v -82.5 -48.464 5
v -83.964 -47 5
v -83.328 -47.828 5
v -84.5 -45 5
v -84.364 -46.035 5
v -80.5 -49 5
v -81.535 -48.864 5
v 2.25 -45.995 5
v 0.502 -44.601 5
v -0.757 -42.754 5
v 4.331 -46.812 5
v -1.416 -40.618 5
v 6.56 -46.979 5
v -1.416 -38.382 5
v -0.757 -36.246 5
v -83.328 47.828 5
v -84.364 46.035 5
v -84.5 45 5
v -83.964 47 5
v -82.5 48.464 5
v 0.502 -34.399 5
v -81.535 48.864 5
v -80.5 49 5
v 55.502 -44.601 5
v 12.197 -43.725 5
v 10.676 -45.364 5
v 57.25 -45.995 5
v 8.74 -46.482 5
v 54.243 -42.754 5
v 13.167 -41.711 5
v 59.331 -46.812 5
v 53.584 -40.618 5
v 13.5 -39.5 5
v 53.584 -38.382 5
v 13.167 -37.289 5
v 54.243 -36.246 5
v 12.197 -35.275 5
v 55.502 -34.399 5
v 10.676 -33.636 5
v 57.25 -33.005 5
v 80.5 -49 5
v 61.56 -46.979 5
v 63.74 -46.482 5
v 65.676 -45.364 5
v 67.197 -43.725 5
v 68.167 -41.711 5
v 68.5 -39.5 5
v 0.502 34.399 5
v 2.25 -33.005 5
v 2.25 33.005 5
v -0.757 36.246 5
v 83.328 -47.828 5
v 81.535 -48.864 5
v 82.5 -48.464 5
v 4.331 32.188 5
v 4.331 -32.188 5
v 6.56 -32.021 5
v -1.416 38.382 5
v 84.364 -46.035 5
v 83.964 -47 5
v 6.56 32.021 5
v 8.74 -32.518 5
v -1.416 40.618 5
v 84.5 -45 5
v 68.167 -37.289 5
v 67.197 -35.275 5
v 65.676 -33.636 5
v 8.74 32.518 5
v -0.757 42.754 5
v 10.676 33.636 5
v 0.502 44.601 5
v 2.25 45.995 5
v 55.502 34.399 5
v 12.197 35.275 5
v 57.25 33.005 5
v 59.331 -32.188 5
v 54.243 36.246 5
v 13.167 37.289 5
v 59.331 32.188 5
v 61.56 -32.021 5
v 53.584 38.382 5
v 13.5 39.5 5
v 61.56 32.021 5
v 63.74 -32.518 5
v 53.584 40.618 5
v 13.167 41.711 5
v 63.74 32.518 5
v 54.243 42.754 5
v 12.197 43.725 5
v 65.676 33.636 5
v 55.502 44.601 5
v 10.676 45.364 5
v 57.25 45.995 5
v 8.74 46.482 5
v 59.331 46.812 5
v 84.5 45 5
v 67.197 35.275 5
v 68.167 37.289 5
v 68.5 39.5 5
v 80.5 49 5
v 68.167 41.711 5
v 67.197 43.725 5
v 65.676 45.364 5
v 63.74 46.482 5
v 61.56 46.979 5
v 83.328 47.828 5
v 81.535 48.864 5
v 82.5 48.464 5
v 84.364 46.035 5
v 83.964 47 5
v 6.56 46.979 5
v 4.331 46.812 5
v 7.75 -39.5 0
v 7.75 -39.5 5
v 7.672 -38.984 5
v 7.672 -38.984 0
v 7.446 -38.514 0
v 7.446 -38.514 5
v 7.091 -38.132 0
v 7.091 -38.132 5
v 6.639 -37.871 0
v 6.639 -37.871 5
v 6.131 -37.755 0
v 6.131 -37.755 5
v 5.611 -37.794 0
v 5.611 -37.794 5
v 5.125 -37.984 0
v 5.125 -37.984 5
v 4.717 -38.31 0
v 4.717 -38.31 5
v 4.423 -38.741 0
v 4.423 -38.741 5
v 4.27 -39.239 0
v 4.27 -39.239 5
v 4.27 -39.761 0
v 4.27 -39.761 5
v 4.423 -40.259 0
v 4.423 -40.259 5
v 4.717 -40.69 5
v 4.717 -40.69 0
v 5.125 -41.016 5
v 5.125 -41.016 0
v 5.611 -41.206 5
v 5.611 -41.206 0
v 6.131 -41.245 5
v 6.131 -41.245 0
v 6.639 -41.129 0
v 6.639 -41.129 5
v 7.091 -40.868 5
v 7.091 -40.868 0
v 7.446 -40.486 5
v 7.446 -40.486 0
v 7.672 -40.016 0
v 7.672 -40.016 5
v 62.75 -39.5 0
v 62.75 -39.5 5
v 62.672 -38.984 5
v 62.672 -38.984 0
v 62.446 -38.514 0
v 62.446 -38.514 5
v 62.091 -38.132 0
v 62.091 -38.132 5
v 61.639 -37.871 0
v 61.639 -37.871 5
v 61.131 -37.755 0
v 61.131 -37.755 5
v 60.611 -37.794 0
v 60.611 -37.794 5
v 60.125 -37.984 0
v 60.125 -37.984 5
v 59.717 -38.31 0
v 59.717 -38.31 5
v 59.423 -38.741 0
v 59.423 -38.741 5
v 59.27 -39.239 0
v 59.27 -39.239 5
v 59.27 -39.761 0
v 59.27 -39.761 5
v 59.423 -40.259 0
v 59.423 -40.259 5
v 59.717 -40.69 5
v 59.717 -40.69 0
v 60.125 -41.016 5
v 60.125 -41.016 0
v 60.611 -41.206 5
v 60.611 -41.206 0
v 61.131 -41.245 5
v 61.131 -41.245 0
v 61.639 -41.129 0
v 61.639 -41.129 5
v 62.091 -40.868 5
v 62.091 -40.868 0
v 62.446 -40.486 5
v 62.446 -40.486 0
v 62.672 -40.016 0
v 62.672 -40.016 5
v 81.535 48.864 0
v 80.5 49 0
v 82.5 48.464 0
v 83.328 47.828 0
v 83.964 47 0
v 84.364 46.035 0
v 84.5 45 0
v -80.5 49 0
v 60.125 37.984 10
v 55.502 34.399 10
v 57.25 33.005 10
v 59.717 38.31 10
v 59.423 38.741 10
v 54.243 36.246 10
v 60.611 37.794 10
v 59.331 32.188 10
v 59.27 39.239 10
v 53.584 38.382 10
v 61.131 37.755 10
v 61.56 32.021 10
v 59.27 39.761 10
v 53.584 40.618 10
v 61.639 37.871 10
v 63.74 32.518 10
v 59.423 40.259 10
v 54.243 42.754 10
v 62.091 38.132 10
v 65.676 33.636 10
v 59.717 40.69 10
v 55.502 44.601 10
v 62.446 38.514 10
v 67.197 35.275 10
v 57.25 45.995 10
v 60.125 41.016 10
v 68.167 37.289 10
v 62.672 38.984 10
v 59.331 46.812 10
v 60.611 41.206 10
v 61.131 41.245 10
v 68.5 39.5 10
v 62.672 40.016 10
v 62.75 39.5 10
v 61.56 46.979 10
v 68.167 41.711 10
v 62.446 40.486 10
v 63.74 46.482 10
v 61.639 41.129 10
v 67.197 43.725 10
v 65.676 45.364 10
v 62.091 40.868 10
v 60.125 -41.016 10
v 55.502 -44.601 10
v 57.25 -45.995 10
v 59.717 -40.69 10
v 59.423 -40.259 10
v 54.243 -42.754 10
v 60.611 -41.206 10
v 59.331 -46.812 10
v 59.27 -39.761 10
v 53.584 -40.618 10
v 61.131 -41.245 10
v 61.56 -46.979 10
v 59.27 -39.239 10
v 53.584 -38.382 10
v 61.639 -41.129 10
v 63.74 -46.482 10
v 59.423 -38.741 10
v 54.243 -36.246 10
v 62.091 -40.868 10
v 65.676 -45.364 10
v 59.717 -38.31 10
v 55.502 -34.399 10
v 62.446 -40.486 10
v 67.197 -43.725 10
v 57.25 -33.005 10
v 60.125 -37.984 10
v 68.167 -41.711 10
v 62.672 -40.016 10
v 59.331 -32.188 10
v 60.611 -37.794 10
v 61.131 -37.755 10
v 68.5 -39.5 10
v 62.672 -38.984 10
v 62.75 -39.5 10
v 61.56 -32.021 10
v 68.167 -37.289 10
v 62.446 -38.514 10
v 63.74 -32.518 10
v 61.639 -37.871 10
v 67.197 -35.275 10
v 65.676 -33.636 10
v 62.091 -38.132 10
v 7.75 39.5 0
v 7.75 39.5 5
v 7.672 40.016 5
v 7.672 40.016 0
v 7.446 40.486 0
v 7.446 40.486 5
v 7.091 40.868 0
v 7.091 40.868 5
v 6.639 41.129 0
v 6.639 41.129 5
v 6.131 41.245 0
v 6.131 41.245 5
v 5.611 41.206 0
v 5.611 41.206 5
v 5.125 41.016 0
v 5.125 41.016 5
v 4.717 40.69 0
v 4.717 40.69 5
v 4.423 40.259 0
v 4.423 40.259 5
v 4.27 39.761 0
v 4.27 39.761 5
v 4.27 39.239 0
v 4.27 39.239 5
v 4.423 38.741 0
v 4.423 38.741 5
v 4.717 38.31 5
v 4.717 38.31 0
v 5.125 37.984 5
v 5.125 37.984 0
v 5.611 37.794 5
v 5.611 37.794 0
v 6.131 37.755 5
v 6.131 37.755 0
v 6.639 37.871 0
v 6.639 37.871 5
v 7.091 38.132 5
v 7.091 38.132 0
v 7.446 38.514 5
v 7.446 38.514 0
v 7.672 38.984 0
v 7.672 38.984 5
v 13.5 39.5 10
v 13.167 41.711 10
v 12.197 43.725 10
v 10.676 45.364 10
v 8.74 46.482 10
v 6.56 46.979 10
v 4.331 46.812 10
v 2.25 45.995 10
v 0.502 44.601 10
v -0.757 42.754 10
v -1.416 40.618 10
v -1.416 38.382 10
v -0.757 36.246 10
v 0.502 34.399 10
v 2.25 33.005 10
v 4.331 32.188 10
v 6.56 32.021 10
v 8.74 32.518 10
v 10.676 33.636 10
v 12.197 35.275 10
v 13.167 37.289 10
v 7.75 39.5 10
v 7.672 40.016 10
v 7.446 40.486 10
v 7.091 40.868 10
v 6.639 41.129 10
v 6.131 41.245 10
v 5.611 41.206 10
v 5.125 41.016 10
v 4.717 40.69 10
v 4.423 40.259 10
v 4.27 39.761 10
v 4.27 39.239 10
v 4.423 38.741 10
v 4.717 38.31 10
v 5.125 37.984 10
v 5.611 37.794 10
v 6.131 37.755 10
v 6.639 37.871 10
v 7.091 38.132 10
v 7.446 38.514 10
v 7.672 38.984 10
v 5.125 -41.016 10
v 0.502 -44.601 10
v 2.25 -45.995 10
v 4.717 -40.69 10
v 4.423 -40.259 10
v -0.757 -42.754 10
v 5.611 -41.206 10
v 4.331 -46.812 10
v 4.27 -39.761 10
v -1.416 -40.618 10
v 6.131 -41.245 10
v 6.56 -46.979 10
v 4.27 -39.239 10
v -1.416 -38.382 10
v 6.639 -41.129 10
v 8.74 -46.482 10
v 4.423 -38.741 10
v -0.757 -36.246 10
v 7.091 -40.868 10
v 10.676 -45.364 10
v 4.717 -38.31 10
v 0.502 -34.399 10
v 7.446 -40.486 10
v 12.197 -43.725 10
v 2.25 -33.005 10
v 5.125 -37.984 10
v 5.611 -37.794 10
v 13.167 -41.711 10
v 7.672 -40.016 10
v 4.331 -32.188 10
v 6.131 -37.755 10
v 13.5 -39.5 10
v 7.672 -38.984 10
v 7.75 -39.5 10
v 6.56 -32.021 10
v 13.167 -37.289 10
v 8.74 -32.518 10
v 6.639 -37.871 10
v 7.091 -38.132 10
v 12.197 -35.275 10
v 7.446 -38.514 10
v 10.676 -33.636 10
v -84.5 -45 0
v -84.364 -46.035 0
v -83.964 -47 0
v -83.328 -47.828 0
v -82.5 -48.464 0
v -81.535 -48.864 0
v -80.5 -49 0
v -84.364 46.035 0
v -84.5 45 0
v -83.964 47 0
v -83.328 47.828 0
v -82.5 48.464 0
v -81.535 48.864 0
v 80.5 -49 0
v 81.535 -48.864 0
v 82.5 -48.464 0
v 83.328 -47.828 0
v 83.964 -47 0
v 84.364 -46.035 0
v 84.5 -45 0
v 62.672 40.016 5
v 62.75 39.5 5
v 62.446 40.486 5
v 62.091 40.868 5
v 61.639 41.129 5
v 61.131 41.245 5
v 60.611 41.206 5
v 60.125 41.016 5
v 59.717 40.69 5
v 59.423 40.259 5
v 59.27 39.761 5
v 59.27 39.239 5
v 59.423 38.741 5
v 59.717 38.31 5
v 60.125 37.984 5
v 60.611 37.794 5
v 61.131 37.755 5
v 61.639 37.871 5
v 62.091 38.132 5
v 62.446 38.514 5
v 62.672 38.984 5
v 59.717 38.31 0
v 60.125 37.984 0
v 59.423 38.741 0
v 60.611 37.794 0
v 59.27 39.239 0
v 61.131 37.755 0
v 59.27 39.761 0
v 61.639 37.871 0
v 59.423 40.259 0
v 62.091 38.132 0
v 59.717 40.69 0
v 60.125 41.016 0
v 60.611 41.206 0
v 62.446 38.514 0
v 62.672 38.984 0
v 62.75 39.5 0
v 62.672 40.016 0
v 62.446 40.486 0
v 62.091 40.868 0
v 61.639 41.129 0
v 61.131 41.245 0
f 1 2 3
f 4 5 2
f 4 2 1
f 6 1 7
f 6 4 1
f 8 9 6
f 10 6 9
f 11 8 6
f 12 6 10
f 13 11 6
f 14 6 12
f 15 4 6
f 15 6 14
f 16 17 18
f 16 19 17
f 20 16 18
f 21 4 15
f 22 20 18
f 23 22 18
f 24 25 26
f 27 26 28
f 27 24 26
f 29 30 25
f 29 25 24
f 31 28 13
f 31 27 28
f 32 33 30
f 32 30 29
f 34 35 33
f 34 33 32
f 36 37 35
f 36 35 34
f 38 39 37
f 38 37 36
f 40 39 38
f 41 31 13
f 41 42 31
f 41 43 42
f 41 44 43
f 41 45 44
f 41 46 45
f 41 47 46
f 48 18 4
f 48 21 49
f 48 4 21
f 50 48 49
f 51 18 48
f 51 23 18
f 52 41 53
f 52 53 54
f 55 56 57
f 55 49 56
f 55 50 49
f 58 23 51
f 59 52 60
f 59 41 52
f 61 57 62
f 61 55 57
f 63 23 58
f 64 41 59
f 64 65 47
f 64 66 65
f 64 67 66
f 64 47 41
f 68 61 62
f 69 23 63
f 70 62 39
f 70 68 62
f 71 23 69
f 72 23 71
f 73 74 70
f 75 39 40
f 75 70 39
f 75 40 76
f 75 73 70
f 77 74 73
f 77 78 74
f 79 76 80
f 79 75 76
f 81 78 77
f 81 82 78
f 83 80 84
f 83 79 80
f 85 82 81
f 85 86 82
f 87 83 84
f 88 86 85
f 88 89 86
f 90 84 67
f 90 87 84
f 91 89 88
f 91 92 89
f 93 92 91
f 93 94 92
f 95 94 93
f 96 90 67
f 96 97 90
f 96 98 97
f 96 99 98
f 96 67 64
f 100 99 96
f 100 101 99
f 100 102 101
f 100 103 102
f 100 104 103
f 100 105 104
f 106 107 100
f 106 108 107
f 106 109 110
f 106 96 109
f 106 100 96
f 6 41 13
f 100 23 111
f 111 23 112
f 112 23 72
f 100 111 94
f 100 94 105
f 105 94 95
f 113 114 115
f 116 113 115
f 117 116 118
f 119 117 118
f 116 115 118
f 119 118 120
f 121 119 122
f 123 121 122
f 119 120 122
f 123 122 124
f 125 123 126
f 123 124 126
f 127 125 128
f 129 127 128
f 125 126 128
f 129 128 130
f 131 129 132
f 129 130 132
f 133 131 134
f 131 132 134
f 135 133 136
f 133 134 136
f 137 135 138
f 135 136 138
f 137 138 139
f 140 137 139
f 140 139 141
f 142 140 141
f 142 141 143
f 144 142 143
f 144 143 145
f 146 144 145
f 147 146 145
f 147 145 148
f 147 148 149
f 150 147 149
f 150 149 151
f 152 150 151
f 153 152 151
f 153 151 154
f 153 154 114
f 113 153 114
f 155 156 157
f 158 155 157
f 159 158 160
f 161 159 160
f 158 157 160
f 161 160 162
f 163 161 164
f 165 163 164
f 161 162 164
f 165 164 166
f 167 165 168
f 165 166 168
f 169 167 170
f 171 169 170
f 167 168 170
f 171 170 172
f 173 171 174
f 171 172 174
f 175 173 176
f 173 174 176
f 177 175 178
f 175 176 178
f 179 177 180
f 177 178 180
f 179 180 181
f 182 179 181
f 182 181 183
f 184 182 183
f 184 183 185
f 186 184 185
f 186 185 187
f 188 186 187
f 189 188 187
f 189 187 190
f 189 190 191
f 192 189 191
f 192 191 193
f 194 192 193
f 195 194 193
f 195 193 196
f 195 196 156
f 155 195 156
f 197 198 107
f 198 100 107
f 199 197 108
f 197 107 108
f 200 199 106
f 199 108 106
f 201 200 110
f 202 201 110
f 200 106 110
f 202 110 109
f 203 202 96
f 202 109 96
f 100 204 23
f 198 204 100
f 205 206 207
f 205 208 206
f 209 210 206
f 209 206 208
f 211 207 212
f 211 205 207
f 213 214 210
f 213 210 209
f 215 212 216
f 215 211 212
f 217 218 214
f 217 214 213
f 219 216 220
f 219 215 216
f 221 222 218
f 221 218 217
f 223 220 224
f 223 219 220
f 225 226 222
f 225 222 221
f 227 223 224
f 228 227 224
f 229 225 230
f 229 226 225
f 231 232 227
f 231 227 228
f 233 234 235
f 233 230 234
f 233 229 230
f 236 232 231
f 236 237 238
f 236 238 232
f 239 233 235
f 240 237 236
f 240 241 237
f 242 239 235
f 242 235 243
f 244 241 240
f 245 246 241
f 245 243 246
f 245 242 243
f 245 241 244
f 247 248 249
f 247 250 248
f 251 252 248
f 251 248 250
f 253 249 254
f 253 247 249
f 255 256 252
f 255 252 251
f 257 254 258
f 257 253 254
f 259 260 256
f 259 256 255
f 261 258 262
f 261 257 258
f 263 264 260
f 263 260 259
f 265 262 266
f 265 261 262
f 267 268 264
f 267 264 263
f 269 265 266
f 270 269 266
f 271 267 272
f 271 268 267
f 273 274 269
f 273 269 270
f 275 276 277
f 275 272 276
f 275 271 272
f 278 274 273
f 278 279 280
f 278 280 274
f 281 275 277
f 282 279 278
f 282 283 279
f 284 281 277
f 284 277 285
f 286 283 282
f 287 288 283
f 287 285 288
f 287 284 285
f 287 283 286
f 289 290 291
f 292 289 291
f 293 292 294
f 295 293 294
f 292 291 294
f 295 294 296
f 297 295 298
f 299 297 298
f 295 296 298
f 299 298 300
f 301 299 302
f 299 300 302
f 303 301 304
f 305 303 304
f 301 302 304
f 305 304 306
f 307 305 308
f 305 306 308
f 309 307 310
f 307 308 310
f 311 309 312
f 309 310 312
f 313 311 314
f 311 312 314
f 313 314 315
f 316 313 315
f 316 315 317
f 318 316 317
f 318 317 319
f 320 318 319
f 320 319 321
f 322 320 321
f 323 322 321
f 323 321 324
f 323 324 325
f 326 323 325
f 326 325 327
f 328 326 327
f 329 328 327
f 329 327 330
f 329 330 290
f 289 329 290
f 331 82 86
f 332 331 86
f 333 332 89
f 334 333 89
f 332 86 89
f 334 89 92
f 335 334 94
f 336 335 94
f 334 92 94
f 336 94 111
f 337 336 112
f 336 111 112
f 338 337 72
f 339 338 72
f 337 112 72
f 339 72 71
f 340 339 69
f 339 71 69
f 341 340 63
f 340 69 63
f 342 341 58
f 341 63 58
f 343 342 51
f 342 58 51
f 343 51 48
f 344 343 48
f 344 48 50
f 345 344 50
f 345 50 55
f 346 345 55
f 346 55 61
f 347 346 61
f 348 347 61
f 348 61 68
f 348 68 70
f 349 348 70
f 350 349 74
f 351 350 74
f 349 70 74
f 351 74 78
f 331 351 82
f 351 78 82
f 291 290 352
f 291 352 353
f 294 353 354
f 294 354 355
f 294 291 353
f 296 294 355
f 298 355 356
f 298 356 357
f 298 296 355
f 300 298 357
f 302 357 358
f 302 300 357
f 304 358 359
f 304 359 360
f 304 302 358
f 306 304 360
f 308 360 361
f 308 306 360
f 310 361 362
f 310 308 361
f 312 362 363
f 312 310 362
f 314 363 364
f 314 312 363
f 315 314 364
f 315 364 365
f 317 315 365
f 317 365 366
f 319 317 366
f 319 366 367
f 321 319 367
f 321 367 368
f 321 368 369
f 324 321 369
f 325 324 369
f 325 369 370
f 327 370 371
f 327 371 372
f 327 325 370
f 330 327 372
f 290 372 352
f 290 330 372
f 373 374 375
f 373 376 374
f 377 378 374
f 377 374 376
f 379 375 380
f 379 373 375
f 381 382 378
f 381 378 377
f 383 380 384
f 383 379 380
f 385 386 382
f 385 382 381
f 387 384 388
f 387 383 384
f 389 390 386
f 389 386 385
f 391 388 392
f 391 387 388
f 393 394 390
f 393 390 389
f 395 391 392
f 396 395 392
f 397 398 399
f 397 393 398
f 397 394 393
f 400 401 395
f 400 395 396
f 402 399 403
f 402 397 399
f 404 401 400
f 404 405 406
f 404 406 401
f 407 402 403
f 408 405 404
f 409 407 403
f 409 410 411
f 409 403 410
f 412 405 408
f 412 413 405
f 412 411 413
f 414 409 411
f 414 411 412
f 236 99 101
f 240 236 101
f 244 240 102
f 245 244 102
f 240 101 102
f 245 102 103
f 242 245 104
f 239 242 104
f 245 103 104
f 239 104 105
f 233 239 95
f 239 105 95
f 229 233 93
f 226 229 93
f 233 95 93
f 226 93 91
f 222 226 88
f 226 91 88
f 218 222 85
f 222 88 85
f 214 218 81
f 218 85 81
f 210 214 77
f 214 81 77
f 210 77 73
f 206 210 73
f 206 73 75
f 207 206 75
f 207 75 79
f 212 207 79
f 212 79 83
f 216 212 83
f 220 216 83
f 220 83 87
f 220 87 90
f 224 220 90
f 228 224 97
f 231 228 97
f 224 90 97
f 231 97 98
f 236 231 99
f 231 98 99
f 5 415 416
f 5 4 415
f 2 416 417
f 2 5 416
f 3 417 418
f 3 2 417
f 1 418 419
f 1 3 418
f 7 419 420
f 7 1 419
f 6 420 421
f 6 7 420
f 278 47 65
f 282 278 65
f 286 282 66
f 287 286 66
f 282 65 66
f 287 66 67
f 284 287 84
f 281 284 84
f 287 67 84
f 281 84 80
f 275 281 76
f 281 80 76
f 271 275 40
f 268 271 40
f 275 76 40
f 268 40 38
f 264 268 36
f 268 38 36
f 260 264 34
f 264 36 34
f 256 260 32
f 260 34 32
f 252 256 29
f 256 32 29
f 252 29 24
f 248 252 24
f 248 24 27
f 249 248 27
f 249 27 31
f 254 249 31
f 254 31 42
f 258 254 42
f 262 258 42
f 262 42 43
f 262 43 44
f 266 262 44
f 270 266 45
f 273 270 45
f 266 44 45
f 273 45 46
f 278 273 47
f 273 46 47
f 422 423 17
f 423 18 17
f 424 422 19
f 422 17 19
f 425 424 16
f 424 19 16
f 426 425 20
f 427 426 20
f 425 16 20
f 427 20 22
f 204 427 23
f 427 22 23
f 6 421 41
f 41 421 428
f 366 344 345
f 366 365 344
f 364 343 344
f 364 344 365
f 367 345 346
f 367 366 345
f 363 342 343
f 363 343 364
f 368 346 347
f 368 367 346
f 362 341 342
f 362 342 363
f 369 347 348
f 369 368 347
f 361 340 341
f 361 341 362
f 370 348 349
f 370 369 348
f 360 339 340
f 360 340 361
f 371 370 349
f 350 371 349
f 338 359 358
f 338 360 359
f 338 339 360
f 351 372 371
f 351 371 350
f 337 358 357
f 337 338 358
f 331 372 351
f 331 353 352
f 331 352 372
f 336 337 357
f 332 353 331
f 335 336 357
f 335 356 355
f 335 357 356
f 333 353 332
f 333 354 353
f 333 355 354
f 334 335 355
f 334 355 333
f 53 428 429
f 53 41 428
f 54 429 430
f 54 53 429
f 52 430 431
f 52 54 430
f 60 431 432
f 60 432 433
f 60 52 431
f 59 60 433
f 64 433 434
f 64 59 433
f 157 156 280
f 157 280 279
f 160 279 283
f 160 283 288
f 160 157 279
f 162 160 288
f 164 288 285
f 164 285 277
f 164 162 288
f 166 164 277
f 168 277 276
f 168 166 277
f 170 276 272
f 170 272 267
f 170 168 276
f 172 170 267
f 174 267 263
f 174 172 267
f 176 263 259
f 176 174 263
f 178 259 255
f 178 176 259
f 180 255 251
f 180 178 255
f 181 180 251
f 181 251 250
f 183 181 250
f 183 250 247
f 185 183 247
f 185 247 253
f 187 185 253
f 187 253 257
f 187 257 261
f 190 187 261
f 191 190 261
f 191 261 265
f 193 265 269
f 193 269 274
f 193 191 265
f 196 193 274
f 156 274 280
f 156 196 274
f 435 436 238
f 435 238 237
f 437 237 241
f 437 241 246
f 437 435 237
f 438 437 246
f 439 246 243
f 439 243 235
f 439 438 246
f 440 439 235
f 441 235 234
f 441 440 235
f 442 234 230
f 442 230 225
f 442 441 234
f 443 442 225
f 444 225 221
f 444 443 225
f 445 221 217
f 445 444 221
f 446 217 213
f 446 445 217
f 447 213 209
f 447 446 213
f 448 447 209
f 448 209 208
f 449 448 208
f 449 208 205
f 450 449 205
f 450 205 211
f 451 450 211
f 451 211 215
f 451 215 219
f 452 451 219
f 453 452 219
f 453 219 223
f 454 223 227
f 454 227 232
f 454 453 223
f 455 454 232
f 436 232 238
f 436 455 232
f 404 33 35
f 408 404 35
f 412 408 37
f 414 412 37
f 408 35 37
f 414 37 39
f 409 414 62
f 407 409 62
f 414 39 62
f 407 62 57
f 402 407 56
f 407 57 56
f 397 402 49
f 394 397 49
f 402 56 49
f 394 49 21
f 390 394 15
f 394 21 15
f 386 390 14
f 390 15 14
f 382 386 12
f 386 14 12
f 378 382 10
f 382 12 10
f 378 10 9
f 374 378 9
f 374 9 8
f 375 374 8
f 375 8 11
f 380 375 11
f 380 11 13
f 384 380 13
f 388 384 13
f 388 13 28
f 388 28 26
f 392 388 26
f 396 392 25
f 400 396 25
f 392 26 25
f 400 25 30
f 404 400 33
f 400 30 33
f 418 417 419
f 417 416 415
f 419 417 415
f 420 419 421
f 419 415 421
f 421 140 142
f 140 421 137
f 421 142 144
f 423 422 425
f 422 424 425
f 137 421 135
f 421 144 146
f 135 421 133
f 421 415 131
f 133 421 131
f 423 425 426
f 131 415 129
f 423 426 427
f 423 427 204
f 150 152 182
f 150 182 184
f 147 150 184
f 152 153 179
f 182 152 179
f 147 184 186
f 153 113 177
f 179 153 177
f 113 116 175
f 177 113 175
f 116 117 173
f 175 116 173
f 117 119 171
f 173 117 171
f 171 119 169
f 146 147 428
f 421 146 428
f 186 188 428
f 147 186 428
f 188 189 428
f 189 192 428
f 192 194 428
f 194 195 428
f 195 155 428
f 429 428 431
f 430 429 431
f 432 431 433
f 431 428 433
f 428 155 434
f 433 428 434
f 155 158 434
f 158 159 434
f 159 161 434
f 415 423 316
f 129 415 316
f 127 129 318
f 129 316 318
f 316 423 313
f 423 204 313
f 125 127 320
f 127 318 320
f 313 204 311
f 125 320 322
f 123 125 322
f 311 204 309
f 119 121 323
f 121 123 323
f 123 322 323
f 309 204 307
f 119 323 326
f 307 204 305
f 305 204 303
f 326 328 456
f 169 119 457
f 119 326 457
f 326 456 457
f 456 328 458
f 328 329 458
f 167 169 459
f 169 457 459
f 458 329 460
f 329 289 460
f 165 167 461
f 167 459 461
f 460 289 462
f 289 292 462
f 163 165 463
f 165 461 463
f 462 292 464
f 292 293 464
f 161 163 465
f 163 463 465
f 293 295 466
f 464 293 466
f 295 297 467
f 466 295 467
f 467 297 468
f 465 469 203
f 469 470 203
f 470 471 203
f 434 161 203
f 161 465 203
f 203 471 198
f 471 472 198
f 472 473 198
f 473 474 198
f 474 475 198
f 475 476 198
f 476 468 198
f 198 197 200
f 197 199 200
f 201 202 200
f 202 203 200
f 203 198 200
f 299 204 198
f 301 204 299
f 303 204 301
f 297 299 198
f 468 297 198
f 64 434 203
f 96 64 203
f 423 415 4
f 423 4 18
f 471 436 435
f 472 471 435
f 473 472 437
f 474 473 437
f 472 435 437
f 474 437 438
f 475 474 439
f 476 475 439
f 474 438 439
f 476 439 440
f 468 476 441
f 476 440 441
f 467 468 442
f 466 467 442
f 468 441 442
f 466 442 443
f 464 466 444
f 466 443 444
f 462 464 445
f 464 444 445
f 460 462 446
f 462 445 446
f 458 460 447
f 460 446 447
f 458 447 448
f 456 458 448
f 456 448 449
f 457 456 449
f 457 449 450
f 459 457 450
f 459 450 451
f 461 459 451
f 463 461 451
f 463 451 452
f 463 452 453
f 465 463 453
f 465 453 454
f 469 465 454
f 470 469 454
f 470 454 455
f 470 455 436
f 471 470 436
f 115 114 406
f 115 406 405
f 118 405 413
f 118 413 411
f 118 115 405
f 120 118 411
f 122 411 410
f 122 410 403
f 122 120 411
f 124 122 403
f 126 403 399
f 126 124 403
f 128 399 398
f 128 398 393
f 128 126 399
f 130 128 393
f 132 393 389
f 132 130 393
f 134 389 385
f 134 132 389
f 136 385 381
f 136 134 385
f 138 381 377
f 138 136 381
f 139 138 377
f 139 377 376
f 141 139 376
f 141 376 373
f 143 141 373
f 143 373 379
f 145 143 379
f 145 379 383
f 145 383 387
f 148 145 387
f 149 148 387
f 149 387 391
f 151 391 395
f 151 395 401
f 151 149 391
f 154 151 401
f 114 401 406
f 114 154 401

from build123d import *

# Parameters (mm, degrees)
SKETCH_W      = 169
SKETCH_H      = 98
PAD_DEPTH     = 5
SKETCH001_R   = 1.75
POCKET_DEPTH  = 5.001
FILLET_R      = 4
SKETCH002_R   = 7.5
SKETCH002_R_2 = 1.75
PAD001_DEPTH  = 5


with BuildPart() as part:
    # Sketch → Pad (new body)
    with BuildSketch(Plane.XY):
        Rectangle(SKETCH_W, SKETCH_H)
    extrude(amount=PAD_DEPTH)

    # Sketch001 (on Face6 of Pad) → Pocket (cut, through all)
    with BuildSketch(Plane.XY.offset(5)):
        with Locations((6, 39.5)):
            Circle(SKETCH001_R)
        with Locations((61, 39.5)):
            Circle(SKETCH001_R)
        with Locations((61, -39.5)):
            Circle(SKETCH001_R)
        with Locations((6, -39.5)):
            Circle(SKETCH001_R)
    extrude(amount=-POCKET_DEPTH, mode=Mode.SUBTRACT)

    # Fillet
    fillet_edges = [part.edges().sort_by_distance(p)[0] for p in [
        (-84.5, 49, 2.5),
        (-84.5, -49, 2.5),
        (84.5, -49, 2.5),
        (84.5, 49, 2.5),
    ]]
    fillet(fillet_edges, radius=FILLET_R)

    # Sketch002 (on Face5 of Pocket) → Pad001 (join)
    with BuildSketch(Plane.XY.offset(5)):
        with Locations((6, 39.5)):
            Circle(SKETCH002_R)
        with Locations((6, 39.5)):
            Circle(SKETCH002_R_2, mode=Mode.SUBTRACT)
        with Locations((61, 39.5)):
            Circle(SKETCH002_R)
        with Locations((61, 39.5)):
            Circle(SKETCH002_R_2, mode=Mode.SUBTRACT)
        with Locations((6, -39.5)):
            Circle(SKETCH002_R)
        with Locations((6, -39.5)):
            Circle(SKETCH002_R_2, mode=Mode.SUBTRACT)
        with Locations((61, -39.5)):
            Circle(SKETCH002_R)
        with Locations((61, -39.5)):
            Circle(SKETCH002_R_2, mode=Mode.SUBTRACT)
    extrude(amount=PAD001_DEPTH)


solid = part.part
